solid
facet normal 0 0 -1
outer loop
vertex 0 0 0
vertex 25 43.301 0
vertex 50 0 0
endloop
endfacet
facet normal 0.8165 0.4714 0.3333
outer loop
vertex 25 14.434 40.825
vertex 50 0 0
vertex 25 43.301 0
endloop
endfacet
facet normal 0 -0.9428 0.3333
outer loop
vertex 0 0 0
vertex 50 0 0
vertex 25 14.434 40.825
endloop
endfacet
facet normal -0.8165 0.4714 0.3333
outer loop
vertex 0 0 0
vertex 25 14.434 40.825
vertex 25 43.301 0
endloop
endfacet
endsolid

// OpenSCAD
include <write.scad> // Write.scad by HarlanDMiiis licensed under the Creative Commons - https://www.thingiverse.com/thing:16193


//
// Get the point on the face of the tetrahedron defined by Pl, Pr, Pt:
//
//               Pt
//               /\    
//              /  \
//             /    \
//            /  ^w  \
//           /   |    \
//         Pl----Pm-->-Pr
//                   v
//
// Pm: middle point between Pl and Pr
// Pv: vector from Pm to Pr of length v
// Pw: vector from Pm to Pt of length w
function getTetraPoint(v, w, sideTriangle, heightTriangle, Pl, Pr, Pt) =
  // Pm = Pl + half of the side times the unit vector from PlPr
  let (Pm = Pl + (sideTriangle / 2) * ((Pr - Pl) / sideTriangle))
  let (Pv = v * ((Pr - Pm) / (sideTriangle / 2)))
  let (Pw = w * ((Pt - Pm) / heightTriangle))
    Pm + Pv + Pw; // linear combination

//
// Write tetrahedron text
//
// Pl, Pr, Pt: point of the face (as for getTetraPoint)
// Tl, Tr, Tt: text for left, right and top
// angleX, angleY, angleZ: rotations for font
// sideTriangle, heightTriangle: triangle dimensions
// font1H, font2H: fonts height
module writeTetra(sideName, Pl, Pr, Pt, Tl, Tr, Tt, angleX, angleY, angleZ, sideTriangle, heightTriangle, font1H, font2H) {
  Pc = getTetraPoint(0, heightTriangle / 2 - font1H / 2, sideTriangle, heightTriangle, Pl, Pr, Pt);
  translate(Pc)
    rotate(angleZ, [0, 0, 1])
      rotate(angleX, [1, 0, 0])
        rotate(angleY, [0, 1, 0])
          write(sideName, h=font1H, t=font1T, center=true);
  
  // text top
  Ptt = getTetraPoint(0, heightTriangle - 1.5 * font2H, sideTriangle, heightTriangle, Pl, Pr, Pt);
  translate(Ptt)
    rotate(angleZ, [0, 0, 1])
      rotate(angleX, [1, 0, 0])
        rotate(angleY, [0, 1, 0])
          write(Tt, h=font2H, t=font2T, center=true);

  // text left
  Ptl = getTetraPoint(-sideTriangle / 3.3, heightTriangle / 7, sideTriangle, heightTriangle, Pl, Pr, Pt);
  translate(Ptl)
    rotate(angleZ, [0, 0, 1])
      rotate(angleX, [1, 0, 0])
        rotate(angleY, [0, 1, 0])
          rotate(-45, [0, 0, 1])
            write(Tl, h=font2H, t=font2T, center=true);

  // text right
  Ptr = getTetraPoint(sideTriangle / 3.3, heightTriangle / 7, sideTriangle, heightTriangle, Pl, Pr, Pt);
  translate(Ptr)
    rotate(angleZ, [0, 0, 1])
      rotate(angleX, [1, 0, 0])
        rotate(angleY, [0, 1, 0])
          rotate(45, [0, 0, 1])
            write(Tr, h=font2H, t=font2T, center=true);
}

//
// --- MAIN
//

a = 50; // triangle / tetrahedron side length

// font central
font1H = 8;
font1T = 2; // depth

// second font
font2H = 6.5;
font2T = 1.5; // depth

difference(){ // extrusion

  // --- equilateral triangle / tetrahedron math
  // sources:
  // https://en.wikipedia.org/wiki/Equilateral_triangle
  // https://en.wikipedia.org/wiki/Tetrahedron

  // height of the equilateral triangle
  hTri = a * (sqrt(3) / 2);

  // radius of the inscribed circle of the triangle
  rTri = hTri / 3;

  // height of the tetrahedron
  hTet = a * sqrt(2 / 3);
      
  // angles of the tetrahedron
  edgeSideAngle = acos(hTet / a);
  sideSideAngle = asin(hTet / hTri);
  edgeEdgeAngle = 60; // OpenSCAD angles are in degrees
  
  // 4 vertices of the tetrahedron
  Pbase1 = [0, 0, 0]; // equilateral triangle
  Pbase2 = [a, 0, 0];
  Pbase3 = [a / 2, hTri, 0];
  Ppick = [a / 2, rTri, hTet]; // pick of the tetrahedron

  // prodebug    
  //echo("hTri");
  //echo(hTri);
  //echo("hTet");
  //echo(hTet);
  //echo("rTri");
  //echo(rTri);

  // --- tetrahedron
  polyhedron(
      points = [Pbase1, Pbase2, Pbase3, Ppick],
      faces = [
          [0, 1, 2], // base
          [0, 3, 1], // face 1
          [0, 2, 3], // face 2
          [1, 3, 2]  // face 3
      ]
  );

  // --- writing on base
  writeTetra("acl", Pbase2, Pbase1, Pbase3, "Y", "X", "Z", 0, 180, 0, a, hTri, font1H, font2H);

  // --- writing face 1
  writeTetra("B @", Pbase1, Pbase2, Ppick, "X", "Y", "F", sideSideAngle, 0, 0, a, hTri, font1H, font2H);

  // --- writing face 2
  writeTetra("B @", Pbase3, Pbase1, Ppick, "Z", "X", "F", sideSideAngle, 0, 240, a, hTri, font1H, font2H);

  // --- writing face 3
  writeTetra("B @", Pbase2, Pbase3, Ppick, "Y", "Z", "F", sideSideAngle, 0, 120, a, hTri, font1H, font2H);
}
